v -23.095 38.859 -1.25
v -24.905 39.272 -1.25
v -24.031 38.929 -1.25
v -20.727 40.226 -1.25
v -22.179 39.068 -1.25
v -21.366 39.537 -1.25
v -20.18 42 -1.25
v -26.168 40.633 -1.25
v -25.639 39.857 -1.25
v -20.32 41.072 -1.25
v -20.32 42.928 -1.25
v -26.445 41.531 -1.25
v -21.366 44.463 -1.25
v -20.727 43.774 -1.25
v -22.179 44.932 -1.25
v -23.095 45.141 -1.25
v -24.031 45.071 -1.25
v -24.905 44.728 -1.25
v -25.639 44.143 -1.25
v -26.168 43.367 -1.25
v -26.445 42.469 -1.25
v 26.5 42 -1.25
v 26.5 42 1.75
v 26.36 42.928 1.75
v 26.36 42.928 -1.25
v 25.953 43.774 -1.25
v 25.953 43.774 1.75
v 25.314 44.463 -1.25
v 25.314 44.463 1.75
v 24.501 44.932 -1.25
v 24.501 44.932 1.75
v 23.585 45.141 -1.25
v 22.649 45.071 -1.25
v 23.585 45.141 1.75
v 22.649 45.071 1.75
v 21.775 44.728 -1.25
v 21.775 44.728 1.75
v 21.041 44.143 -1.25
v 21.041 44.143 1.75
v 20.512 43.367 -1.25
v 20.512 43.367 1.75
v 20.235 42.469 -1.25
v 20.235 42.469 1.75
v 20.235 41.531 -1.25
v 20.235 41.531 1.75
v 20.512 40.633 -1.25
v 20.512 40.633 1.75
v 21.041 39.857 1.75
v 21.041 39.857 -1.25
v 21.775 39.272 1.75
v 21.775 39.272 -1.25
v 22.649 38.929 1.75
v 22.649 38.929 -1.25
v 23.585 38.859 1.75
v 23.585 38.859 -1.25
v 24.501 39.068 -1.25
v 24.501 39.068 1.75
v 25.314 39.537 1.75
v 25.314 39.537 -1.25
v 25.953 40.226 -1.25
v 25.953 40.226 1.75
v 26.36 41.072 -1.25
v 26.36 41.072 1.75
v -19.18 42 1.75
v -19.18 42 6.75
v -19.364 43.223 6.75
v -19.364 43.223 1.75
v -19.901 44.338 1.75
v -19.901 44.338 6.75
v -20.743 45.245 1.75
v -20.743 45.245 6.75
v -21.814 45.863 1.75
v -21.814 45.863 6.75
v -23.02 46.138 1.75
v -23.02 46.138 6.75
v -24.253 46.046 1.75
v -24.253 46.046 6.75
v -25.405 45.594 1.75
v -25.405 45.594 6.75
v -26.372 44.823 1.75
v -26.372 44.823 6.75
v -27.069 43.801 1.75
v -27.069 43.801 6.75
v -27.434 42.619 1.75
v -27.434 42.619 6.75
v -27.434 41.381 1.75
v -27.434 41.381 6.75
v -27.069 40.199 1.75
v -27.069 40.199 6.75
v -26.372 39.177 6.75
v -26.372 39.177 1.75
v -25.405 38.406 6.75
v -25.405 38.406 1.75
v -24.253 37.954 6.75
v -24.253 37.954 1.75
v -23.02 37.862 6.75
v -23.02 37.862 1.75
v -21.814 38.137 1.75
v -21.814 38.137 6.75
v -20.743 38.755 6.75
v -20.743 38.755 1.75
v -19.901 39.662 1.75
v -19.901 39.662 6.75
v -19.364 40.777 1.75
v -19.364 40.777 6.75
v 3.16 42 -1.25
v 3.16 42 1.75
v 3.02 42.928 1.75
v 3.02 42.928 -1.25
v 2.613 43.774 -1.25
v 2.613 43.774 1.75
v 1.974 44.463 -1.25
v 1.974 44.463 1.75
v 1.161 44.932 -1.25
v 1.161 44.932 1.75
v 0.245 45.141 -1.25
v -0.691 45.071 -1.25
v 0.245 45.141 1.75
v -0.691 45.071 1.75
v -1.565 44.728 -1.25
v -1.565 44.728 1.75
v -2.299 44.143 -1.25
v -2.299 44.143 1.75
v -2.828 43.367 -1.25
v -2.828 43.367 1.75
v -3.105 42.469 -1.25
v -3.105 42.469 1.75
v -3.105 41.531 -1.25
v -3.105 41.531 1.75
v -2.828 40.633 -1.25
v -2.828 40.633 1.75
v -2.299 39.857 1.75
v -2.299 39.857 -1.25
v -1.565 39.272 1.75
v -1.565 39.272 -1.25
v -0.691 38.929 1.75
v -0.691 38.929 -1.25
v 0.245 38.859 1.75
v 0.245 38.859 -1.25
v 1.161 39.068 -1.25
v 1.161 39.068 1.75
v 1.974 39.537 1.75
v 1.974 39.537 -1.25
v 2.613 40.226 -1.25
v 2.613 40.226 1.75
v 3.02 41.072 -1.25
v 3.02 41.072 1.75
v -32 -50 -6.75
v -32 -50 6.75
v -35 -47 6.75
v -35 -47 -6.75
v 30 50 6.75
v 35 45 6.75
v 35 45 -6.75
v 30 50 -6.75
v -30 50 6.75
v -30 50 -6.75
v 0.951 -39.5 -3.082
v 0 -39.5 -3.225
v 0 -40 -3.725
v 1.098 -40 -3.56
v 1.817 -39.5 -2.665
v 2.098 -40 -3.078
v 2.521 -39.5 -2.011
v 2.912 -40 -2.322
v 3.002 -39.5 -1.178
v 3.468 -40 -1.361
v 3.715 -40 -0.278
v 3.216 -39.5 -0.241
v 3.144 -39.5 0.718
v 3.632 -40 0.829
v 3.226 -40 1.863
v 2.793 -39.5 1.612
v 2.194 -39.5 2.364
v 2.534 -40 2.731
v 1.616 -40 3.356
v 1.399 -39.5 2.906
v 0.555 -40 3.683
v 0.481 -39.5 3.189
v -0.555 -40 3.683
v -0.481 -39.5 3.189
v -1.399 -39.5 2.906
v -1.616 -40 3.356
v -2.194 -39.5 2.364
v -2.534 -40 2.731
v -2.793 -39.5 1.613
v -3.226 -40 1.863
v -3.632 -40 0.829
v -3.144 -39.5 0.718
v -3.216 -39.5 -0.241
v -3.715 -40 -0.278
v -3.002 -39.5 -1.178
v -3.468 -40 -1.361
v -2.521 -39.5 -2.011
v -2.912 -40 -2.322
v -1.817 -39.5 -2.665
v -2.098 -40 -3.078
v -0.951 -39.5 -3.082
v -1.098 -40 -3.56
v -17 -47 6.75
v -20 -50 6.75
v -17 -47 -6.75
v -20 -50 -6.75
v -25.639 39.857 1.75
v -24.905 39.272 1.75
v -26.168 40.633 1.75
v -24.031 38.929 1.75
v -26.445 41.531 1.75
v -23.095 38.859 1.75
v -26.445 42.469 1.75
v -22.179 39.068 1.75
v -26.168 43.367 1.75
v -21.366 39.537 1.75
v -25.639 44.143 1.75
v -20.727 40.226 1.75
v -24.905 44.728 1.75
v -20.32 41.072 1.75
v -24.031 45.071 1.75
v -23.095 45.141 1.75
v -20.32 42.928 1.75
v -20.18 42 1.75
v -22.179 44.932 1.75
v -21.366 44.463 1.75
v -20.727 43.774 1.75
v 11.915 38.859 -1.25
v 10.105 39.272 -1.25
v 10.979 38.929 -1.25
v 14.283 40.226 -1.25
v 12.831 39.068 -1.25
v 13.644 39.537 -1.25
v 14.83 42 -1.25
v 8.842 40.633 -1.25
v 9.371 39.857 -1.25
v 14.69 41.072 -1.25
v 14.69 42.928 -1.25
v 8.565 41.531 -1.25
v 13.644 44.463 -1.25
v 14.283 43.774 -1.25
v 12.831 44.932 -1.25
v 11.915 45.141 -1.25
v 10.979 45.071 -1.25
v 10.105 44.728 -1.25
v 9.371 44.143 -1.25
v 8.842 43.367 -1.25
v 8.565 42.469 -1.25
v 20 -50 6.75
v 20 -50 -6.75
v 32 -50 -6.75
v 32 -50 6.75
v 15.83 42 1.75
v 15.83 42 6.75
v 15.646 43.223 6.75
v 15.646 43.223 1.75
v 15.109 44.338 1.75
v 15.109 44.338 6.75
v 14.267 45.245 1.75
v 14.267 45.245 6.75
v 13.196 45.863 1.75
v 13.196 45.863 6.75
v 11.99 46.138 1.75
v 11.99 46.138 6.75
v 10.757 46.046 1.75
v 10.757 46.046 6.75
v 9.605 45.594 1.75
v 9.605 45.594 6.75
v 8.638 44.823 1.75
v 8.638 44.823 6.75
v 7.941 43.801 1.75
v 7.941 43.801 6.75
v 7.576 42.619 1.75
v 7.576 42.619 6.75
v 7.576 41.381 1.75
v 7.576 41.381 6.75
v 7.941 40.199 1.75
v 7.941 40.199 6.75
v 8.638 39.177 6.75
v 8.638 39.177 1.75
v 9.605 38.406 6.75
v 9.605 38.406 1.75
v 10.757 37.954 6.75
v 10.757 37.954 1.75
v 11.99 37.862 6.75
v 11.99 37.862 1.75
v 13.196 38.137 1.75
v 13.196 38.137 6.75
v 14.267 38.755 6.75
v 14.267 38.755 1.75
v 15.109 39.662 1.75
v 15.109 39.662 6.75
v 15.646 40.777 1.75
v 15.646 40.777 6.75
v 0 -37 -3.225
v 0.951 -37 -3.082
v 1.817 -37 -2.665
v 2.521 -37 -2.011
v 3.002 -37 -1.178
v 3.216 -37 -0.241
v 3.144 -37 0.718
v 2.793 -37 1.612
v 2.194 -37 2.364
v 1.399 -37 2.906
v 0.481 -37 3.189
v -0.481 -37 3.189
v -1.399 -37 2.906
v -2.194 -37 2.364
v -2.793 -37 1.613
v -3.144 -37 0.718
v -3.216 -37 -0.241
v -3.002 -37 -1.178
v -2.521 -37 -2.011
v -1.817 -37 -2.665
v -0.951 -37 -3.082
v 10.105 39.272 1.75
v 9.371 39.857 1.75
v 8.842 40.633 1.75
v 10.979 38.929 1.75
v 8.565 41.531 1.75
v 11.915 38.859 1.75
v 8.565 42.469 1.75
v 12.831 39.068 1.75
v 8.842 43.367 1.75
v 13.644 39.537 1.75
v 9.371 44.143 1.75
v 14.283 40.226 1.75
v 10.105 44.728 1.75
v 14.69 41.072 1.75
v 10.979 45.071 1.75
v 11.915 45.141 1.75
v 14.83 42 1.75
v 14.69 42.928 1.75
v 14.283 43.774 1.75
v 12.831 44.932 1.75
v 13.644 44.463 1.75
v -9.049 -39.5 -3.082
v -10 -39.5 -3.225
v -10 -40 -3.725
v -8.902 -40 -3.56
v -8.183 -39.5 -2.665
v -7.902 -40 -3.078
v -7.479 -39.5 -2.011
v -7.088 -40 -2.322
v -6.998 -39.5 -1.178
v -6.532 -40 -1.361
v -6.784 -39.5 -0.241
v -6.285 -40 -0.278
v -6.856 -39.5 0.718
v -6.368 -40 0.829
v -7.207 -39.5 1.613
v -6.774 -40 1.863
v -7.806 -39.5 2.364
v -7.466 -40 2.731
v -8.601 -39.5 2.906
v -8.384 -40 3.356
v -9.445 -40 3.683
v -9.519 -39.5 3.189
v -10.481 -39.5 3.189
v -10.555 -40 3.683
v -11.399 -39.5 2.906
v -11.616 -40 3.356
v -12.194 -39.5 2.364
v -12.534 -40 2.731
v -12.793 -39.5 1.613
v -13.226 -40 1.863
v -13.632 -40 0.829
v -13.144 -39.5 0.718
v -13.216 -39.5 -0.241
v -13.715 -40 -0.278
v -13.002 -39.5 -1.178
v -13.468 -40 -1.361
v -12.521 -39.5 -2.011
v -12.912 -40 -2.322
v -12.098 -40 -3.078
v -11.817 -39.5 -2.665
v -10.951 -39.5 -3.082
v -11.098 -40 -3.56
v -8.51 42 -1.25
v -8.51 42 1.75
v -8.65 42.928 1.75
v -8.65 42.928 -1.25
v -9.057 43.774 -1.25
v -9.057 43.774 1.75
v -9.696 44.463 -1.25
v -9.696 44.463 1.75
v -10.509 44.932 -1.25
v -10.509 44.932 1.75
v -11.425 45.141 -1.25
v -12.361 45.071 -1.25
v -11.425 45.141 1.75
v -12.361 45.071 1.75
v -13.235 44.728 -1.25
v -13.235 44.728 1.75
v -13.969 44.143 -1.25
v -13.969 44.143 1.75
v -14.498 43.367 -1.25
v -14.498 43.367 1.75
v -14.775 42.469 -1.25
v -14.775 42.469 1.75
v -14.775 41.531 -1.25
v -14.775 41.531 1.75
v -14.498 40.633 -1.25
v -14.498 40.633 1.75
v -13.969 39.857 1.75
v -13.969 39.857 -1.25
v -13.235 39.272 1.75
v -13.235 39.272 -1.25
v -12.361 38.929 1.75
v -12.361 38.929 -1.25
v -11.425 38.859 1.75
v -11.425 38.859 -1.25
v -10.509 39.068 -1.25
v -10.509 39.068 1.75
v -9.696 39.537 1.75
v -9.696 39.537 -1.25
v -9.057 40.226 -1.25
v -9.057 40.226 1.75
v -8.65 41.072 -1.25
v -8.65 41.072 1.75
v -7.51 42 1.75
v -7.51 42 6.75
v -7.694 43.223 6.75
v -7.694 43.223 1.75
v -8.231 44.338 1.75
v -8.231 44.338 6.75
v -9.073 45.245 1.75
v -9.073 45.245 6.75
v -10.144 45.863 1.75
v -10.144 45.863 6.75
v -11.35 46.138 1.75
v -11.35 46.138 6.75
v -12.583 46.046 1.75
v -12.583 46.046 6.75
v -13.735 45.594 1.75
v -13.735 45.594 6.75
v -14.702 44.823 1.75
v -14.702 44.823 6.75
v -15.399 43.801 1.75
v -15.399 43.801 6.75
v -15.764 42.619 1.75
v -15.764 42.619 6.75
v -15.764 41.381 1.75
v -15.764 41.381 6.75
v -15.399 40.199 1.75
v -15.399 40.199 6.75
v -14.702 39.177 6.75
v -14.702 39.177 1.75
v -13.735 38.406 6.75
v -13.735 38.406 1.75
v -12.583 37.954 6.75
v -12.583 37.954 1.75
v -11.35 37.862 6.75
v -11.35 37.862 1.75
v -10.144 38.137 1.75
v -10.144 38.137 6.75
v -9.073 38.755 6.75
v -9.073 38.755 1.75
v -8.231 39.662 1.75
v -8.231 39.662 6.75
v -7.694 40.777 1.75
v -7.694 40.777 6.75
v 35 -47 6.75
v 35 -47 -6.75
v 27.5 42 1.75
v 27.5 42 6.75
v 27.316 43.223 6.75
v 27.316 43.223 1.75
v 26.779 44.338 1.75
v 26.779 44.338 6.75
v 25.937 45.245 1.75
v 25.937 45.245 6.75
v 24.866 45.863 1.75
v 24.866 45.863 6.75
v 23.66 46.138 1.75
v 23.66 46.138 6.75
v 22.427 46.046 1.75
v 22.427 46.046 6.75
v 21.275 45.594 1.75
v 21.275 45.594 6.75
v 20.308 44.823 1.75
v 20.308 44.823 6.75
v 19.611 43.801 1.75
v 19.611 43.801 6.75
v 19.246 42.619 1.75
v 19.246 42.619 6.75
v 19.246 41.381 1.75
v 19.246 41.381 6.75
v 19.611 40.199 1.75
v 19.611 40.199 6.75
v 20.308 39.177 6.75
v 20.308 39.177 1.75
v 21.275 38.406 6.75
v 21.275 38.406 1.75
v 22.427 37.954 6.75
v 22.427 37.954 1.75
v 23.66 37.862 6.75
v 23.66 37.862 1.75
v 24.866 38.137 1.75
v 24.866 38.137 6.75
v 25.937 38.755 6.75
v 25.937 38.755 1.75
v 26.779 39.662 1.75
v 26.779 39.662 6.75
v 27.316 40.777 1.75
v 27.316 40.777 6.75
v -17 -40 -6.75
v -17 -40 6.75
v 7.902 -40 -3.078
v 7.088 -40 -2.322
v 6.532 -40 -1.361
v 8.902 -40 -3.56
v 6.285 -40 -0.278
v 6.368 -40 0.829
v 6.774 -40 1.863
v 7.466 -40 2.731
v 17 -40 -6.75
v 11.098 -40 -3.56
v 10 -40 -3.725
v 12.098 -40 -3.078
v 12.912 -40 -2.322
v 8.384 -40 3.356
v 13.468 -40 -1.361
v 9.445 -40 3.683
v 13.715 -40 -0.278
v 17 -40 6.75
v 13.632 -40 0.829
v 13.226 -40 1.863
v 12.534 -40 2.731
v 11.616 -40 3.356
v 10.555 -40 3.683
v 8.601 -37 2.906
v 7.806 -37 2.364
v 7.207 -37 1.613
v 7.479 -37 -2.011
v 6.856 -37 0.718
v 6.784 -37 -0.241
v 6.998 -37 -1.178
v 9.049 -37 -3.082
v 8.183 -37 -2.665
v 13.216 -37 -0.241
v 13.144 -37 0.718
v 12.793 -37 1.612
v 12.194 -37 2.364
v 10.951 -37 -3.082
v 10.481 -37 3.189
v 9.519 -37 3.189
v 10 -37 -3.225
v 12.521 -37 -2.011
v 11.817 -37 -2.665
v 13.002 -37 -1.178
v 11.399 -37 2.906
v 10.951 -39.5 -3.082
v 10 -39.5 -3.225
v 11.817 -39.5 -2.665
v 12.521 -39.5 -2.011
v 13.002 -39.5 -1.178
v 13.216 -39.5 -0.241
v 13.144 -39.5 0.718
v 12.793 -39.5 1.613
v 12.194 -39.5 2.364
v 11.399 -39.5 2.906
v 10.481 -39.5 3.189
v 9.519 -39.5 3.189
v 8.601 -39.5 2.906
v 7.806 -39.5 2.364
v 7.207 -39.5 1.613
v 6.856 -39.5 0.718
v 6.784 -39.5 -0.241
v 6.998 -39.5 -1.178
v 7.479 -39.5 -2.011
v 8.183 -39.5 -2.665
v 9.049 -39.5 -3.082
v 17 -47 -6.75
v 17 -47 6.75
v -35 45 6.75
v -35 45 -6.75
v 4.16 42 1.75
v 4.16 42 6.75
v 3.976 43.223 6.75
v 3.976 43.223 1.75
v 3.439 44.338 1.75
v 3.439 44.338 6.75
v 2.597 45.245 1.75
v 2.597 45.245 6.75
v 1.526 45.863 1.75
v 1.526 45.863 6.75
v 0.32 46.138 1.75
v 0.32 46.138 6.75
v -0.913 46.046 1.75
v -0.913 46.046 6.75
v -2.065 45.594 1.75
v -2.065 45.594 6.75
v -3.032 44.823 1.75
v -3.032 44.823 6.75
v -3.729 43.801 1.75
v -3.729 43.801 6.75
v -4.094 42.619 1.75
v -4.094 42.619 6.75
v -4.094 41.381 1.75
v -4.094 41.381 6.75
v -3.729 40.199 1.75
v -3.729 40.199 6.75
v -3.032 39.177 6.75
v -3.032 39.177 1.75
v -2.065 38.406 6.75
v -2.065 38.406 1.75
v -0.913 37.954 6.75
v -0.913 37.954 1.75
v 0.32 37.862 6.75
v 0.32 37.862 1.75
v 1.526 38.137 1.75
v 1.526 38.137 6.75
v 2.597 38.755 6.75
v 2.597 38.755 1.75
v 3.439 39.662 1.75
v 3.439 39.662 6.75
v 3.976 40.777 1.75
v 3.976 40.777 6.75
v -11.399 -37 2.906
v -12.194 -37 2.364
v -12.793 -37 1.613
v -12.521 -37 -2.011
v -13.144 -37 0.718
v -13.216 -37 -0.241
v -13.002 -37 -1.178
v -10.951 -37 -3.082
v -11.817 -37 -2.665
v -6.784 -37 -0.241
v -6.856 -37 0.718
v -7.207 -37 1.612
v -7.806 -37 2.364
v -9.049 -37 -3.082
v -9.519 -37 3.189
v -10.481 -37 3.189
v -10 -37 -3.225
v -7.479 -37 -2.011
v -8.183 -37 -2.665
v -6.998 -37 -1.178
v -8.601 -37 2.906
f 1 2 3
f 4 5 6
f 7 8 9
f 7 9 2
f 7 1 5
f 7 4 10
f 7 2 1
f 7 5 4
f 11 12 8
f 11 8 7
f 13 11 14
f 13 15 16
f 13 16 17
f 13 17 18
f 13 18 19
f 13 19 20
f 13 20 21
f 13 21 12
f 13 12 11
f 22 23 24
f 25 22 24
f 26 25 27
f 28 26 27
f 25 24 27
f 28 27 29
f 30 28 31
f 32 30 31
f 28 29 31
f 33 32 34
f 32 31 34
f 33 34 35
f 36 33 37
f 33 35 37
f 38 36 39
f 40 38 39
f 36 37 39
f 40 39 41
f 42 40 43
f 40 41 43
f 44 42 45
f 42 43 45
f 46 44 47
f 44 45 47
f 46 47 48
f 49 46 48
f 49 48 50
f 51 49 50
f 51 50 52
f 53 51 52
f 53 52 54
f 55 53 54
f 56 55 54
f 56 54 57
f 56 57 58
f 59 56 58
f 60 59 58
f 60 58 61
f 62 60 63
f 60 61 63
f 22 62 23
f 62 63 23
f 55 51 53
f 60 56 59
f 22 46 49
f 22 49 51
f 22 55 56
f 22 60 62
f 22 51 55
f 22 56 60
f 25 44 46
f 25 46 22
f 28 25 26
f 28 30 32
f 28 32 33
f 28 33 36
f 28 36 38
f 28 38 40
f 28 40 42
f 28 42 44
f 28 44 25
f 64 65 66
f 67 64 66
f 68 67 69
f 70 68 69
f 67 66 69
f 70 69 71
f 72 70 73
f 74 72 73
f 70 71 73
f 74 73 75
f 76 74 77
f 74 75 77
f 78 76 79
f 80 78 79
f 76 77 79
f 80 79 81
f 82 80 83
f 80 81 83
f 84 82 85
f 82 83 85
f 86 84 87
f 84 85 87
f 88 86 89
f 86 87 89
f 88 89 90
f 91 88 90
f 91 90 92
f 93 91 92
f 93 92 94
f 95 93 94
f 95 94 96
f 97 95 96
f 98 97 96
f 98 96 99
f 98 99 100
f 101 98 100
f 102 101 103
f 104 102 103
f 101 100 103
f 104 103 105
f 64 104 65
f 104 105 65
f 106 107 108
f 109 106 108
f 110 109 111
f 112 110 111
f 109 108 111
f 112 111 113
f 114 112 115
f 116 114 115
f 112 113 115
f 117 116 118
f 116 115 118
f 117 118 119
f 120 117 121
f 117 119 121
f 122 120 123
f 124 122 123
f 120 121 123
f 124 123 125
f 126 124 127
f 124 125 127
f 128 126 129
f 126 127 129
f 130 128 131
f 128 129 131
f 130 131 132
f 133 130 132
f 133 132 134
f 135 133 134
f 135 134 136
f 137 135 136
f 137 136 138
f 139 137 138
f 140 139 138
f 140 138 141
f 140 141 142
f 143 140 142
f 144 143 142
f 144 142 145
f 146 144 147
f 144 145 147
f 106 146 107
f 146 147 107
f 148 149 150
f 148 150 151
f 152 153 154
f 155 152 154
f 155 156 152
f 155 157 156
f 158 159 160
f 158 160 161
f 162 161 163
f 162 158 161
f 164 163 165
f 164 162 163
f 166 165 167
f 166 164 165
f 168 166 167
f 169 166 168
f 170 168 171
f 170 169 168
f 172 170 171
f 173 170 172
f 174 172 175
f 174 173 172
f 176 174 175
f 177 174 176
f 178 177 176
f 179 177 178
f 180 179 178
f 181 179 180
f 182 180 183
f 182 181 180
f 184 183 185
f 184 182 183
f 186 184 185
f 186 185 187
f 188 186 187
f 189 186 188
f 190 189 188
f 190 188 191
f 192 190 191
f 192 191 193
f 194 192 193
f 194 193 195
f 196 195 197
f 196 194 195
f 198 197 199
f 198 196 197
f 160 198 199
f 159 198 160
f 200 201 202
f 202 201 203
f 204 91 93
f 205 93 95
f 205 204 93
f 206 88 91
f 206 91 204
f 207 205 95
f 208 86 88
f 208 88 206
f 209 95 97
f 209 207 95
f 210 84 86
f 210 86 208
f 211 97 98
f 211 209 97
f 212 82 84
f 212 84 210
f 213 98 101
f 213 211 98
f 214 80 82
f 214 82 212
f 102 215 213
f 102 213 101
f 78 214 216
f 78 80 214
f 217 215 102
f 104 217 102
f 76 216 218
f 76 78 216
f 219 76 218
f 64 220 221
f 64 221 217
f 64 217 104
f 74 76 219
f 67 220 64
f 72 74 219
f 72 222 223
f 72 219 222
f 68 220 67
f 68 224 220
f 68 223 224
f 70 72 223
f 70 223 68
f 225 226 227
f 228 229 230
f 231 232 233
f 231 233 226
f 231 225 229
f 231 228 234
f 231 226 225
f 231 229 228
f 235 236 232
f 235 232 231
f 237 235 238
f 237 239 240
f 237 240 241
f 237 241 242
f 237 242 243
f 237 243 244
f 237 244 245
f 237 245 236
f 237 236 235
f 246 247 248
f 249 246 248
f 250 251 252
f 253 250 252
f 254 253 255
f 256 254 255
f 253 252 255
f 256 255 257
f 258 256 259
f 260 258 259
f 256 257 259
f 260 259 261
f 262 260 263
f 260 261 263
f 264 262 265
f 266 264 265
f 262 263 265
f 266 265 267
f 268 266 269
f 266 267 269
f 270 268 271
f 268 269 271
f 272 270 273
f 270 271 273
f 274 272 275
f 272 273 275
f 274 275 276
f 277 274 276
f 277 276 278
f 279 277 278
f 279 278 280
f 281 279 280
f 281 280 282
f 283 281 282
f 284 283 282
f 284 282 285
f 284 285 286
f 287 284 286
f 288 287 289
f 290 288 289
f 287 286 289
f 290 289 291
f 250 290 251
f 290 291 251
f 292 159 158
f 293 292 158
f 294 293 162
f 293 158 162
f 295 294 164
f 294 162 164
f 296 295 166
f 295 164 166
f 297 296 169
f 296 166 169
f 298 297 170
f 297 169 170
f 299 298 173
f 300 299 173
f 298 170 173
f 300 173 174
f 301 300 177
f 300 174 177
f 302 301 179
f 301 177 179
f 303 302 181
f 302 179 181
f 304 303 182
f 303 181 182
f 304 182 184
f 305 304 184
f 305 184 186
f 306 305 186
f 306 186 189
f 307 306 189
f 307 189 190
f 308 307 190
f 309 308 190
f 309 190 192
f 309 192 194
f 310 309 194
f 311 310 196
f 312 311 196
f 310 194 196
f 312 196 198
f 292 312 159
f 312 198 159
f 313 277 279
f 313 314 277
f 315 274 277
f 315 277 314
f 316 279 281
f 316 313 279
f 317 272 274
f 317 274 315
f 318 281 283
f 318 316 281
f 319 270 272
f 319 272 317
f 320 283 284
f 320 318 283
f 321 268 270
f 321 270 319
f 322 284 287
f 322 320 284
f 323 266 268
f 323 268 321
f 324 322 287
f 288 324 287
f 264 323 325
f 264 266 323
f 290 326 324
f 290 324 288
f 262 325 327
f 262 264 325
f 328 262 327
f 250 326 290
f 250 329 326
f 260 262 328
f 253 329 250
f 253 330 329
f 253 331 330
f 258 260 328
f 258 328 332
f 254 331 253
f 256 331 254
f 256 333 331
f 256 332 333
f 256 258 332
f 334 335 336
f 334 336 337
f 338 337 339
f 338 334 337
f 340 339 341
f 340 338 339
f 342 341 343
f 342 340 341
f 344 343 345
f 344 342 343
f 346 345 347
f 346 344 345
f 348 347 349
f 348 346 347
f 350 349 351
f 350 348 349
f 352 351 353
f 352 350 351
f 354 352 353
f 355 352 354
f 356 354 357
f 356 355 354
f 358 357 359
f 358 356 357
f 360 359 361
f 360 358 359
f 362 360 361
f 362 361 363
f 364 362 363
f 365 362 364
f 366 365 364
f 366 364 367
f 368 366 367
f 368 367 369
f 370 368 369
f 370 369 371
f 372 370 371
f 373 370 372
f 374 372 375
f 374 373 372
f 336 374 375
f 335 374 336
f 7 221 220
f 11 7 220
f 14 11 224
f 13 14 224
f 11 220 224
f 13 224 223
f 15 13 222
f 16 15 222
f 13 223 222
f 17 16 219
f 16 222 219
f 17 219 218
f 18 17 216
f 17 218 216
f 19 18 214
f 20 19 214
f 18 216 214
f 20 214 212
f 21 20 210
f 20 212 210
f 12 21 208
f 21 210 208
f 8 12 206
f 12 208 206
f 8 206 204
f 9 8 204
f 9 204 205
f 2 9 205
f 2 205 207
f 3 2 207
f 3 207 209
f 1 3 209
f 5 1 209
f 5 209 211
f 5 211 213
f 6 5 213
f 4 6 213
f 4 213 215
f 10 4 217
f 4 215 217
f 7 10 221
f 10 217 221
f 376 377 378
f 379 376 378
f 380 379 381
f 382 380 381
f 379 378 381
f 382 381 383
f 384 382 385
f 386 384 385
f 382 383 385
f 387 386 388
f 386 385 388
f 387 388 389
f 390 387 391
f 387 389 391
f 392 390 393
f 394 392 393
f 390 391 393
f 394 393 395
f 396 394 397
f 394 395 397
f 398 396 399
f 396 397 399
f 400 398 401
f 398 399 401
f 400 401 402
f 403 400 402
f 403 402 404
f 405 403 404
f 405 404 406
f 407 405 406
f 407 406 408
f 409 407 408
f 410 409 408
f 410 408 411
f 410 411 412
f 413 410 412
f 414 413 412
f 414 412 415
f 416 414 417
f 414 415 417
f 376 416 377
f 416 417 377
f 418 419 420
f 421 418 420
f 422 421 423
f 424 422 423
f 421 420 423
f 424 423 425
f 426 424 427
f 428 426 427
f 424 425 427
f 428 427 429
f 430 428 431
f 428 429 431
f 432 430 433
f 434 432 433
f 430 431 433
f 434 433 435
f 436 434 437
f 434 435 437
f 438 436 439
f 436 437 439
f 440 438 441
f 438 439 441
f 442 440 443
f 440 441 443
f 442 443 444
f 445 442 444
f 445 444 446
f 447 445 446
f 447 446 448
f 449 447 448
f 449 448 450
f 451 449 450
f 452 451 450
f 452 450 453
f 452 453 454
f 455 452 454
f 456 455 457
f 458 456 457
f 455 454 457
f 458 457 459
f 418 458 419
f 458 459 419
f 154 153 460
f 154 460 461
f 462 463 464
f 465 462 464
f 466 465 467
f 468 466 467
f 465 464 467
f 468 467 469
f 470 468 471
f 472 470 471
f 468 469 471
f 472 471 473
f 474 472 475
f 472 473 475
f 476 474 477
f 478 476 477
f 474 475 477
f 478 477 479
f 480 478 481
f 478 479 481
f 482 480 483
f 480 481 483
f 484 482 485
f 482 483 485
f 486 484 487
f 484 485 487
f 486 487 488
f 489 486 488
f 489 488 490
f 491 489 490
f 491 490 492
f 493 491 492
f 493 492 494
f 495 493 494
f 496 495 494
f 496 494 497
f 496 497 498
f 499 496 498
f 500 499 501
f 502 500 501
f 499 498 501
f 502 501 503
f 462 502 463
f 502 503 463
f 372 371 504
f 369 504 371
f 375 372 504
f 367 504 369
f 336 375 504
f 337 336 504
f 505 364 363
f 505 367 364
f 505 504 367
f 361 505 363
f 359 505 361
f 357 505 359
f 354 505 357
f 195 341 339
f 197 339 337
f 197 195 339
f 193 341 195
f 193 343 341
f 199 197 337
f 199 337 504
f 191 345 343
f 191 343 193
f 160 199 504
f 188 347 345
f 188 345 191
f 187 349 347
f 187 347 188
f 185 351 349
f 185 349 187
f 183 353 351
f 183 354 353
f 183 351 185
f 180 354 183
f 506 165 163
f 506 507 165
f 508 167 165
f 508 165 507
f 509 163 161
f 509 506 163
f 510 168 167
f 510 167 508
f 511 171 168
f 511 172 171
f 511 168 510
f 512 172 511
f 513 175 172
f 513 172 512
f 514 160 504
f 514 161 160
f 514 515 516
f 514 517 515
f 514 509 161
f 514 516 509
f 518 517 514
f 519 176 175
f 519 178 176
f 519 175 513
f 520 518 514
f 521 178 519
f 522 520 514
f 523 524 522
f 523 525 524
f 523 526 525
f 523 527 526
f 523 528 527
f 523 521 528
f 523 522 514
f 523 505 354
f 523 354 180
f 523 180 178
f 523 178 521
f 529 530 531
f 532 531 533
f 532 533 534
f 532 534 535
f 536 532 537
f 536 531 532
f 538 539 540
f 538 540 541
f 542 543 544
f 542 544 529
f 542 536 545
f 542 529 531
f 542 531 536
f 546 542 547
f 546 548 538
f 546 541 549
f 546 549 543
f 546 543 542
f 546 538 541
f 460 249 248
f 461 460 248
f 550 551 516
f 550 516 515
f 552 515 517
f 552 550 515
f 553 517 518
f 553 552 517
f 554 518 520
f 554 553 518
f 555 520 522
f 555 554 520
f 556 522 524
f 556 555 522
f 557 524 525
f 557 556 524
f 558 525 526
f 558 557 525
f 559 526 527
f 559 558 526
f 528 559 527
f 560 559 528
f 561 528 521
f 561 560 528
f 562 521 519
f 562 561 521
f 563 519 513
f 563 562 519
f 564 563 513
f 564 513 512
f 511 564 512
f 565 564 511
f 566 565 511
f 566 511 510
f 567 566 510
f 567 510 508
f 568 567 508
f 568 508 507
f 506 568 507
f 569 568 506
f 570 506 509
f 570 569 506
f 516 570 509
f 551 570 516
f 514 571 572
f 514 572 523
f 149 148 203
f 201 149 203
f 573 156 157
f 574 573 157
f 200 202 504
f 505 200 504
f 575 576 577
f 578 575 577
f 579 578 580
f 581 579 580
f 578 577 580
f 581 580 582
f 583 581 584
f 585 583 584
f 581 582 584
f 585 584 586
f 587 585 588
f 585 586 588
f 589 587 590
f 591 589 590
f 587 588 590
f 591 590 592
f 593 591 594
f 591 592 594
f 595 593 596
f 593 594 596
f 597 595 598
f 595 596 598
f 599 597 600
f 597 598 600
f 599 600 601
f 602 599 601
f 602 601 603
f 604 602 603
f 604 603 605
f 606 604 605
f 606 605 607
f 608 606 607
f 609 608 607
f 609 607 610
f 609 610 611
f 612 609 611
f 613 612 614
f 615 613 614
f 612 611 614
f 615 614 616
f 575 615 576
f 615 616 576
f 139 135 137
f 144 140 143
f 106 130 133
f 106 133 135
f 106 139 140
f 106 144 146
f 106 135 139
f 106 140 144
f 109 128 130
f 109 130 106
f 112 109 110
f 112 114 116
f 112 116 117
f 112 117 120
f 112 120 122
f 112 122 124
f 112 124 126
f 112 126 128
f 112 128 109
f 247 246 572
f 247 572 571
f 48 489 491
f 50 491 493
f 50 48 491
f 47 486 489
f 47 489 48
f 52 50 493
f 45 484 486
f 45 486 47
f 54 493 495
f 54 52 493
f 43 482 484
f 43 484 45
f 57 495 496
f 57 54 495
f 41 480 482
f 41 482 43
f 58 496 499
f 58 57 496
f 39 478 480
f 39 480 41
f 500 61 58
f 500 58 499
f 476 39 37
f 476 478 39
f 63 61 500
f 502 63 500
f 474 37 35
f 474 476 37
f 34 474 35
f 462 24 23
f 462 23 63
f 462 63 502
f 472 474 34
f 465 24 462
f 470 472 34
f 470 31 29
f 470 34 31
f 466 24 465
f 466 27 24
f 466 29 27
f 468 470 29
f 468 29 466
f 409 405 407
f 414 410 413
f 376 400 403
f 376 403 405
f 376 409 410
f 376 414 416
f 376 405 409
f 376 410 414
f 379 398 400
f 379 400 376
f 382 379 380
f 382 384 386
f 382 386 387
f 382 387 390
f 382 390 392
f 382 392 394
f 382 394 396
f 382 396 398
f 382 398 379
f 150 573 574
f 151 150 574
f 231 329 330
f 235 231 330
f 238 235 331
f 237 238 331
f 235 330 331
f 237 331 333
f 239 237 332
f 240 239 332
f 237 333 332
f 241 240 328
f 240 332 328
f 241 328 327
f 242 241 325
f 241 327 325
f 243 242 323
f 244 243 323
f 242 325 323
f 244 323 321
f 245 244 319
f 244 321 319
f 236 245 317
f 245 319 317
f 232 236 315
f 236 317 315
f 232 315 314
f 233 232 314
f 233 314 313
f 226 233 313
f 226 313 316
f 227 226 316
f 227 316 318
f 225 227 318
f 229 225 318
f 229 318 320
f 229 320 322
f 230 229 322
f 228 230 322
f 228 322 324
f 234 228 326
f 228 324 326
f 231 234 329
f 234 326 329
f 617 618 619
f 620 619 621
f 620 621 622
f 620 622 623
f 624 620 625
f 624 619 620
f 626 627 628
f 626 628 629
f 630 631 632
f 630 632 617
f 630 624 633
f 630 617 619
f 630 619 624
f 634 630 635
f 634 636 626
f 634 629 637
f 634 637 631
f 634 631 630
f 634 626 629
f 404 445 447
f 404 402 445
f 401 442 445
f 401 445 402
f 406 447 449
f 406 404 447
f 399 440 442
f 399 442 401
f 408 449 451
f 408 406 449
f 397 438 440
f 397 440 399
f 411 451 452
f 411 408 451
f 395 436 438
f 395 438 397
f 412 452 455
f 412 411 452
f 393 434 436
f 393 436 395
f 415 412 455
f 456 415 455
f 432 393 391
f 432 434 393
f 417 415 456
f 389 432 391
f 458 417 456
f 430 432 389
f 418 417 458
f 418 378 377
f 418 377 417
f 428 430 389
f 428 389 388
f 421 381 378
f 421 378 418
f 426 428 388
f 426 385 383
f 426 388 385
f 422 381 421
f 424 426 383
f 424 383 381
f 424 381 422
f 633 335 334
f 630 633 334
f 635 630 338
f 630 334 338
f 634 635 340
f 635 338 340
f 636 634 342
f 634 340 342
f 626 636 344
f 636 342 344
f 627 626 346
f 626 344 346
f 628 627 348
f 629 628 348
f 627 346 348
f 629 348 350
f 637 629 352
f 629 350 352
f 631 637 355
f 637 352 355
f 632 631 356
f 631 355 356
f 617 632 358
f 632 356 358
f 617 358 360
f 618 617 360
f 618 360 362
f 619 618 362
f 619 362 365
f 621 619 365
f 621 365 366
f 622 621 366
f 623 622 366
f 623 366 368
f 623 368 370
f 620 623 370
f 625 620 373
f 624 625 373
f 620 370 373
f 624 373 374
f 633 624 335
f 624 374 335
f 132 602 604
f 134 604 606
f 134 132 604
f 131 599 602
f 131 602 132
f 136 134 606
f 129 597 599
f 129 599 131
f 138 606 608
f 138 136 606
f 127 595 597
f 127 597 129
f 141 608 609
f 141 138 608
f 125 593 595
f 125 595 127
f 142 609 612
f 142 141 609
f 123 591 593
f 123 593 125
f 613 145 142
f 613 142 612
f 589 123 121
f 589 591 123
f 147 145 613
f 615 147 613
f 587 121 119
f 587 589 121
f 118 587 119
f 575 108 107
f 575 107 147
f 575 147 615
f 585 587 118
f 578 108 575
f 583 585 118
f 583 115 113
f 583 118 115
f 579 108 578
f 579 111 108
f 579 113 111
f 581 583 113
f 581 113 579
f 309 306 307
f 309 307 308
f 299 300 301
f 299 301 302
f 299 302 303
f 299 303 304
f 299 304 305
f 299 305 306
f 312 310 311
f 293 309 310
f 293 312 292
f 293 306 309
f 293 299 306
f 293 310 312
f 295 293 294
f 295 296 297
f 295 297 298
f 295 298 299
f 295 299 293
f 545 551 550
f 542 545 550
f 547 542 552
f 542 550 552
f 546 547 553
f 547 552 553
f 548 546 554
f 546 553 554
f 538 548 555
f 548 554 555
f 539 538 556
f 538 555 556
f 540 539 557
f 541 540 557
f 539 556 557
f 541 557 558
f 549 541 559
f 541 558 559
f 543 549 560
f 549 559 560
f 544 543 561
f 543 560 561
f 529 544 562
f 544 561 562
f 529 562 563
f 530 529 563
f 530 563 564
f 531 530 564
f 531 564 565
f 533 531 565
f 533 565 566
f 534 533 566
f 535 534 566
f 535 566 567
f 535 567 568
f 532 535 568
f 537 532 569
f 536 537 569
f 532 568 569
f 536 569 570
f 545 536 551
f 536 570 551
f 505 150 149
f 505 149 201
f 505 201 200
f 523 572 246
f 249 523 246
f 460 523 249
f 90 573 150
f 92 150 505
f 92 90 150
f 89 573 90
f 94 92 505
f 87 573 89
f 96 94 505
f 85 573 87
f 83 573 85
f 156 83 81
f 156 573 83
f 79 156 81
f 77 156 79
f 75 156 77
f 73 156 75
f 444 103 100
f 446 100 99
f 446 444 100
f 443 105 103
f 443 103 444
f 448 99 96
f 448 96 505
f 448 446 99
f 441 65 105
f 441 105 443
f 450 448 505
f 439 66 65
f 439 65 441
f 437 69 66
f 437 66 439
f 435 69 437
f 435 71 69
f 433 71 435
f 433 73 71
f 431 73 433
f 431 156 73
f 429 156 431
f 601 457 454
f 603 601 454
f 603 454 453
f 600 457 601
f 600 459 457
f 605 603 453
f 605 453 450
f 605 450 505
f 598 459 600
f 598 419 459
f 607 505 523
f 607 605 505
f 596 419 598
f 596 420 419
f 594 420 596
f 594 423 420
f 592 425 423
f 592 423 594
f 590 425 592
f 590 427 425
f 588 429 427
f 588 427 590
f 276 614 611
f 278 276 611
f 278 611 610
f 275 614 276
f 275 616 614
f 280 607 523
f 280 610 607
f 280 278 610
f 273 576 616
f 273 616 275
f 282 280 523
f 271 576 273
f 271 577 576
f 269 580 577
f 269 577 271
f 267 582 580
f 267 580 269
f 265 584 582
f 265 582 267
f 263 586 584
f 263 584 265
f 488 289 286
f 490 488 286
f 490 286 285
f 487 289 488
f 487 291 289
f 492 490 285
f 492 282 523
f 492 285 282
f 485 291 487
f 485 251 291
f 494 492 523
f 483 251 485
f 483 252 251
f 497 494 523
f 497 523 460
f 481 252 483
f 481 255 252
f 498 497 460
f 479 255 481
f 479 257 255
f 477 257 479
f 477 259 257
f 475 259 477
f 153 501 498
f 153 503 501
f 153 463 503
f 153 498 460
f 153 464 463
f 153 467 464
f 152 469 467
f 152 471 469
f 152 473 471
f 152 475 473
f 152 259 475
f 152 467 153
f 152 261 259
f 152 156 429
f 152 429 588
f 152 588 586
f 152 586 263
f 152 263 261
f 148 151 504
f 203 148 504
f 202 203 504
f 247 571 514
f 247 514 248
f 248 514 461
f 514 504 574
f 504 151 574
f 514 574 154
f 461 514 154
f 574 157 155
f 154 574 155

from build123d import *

# Parameters (mm, degrees)
SKETCH1_W           = 70
SKETCH1_H           = 13.5
BOSS_EXTRUDE1_DEPTH = 50
SKETCH2_W           = 34
SKETCH2_H           = 10
CUT_EXTRUDE1_DEPTH  = 100
SKETCH3_R           = 3.225
CUT_EXTRUDE2_DEPTH  = 3
CHAMFER1_SIZE       = 0.5
SKETCH4_R           = 4.15
CUT_EXTRUDE3_DEPTH  = 5
SKETCH5_R           = 3.15
CUT_EXTRUDE4_DEPTH  = 3
CHAMFER2_SIZE       = 3
CHAMFER3_SIZE       = 5


with BuildPart() as part:
    # Sketch1 → Boss-Extrude1 (new, symmetric)
    with BuildSketch(Plane(origin=(0, 0, 0), x_dir=(1, 0, 0), z_dir=(0, 1, 0))):
        Rectangle(SKETCH1_W, SKETCH1_H)
    extrude(amount=BOSS_EXTRUDE1_DEPTH, both=True)

    # Sketch2 → Cut-Extrude1 (cut)
    with BuildSketch(Plane.XY.offset(6.75)):
        with Locations((0, -45)):
            Rectangle(SKETCH2_W, SKETCH2_H)
    extrude(amount=-CUT_EXTRUDE1_DEPTH, mode=Mode.SUBTRACT)

    # Sketch3 → Cut-Extrude2 (cut)
    with BuildSketch(Plane.XZ.offset(40)):
        with Locations(Location((-10, 0, 0), (0, 0, 270))):
            Circle(SKETCH3_R)
        with Locations(Location((0, 0, 0), (0, 0, 270))):
            Circle(SKETCH3_R)
        with Locations(Location((10, 0, 0), (0, 0, 270))):
            Circle(SKETCH3_R)
    extrude(amount=-CUT_EXTRUDE2_DEPTH, mode=Mode.SUBTRACT)

    # Chamfer1
    chamfer1_edges = [part.edges().sort_by_distance(p)[0] for p in [
        (-10, -40, 3.225),
        (0, -40, 3.225),
        (10, -40, 3.225),
    ]]
    chamfer(chamfer1_edges, length=CHAMFER1_SIZE)

    # Sketch4 → Cut-Extrude3 (cut)
    with BuildSketch(Plane.XY.offset(6.75)):
        with Locations((-23.33, 42)):
            Circle(SKETCH4_R)
        with Locations((-11.66, 42)):
            Circle(SKETCH4_R)
        with Locations((0.01, 42)):
            Circle(SKETCH4_R)
        with Locations((11.68, 42)):
            Circle(SKETCH4_R)
        with Locations((23.35, 42)):
            Circle(SKETCH4_R)
    extrude(amount=-CUT_EXTRUDE3_DEPTH, mode=Mode.SUBTRACT)

    # Sketch5 → Cut-Extrude4 (cut)
    with BuildSketch(Plane.XY.offset(1.75)):
        with Locations((-23.33, 42)):
            Circle(SKETCH5_R)
        with Locations((-11.66, 42)):
            Circle(SKETCH5_R)
        with Locations((0.01, 42)):
            Circle(SKETCH5_R)
        with Locations((11.68, 42)):
            Circle(SKETCH5_R)
        with Locations((23.35, 42)):
            Circle(SKETCH5_R)
    extrude(amount=-CUT_EXTRUDE4_DEPTH, mode=Mode.SUBTRACT)

    # Chamfer2
    chamfer2_edges = [part.edges().sort_by_distance(p)[0] for p in [
        (17, -50, 0),
        (-17, -50, 0),
        (-35, -50, 0),
        (35, -50, 0),
    ]]
    chamfer(chamfer2_edges, length=CHAMFER2_SIZE)

    # Chamfer3
    chamfer3_edges = [part.edges().sort_by_distance(p)[0] for p in [
        (-35, 50, 0),
        (35, 50, 0),
    ]]
    chamfer(chamfer3_edges, length=CHAMFER3_SIZE)


solid = part.part
